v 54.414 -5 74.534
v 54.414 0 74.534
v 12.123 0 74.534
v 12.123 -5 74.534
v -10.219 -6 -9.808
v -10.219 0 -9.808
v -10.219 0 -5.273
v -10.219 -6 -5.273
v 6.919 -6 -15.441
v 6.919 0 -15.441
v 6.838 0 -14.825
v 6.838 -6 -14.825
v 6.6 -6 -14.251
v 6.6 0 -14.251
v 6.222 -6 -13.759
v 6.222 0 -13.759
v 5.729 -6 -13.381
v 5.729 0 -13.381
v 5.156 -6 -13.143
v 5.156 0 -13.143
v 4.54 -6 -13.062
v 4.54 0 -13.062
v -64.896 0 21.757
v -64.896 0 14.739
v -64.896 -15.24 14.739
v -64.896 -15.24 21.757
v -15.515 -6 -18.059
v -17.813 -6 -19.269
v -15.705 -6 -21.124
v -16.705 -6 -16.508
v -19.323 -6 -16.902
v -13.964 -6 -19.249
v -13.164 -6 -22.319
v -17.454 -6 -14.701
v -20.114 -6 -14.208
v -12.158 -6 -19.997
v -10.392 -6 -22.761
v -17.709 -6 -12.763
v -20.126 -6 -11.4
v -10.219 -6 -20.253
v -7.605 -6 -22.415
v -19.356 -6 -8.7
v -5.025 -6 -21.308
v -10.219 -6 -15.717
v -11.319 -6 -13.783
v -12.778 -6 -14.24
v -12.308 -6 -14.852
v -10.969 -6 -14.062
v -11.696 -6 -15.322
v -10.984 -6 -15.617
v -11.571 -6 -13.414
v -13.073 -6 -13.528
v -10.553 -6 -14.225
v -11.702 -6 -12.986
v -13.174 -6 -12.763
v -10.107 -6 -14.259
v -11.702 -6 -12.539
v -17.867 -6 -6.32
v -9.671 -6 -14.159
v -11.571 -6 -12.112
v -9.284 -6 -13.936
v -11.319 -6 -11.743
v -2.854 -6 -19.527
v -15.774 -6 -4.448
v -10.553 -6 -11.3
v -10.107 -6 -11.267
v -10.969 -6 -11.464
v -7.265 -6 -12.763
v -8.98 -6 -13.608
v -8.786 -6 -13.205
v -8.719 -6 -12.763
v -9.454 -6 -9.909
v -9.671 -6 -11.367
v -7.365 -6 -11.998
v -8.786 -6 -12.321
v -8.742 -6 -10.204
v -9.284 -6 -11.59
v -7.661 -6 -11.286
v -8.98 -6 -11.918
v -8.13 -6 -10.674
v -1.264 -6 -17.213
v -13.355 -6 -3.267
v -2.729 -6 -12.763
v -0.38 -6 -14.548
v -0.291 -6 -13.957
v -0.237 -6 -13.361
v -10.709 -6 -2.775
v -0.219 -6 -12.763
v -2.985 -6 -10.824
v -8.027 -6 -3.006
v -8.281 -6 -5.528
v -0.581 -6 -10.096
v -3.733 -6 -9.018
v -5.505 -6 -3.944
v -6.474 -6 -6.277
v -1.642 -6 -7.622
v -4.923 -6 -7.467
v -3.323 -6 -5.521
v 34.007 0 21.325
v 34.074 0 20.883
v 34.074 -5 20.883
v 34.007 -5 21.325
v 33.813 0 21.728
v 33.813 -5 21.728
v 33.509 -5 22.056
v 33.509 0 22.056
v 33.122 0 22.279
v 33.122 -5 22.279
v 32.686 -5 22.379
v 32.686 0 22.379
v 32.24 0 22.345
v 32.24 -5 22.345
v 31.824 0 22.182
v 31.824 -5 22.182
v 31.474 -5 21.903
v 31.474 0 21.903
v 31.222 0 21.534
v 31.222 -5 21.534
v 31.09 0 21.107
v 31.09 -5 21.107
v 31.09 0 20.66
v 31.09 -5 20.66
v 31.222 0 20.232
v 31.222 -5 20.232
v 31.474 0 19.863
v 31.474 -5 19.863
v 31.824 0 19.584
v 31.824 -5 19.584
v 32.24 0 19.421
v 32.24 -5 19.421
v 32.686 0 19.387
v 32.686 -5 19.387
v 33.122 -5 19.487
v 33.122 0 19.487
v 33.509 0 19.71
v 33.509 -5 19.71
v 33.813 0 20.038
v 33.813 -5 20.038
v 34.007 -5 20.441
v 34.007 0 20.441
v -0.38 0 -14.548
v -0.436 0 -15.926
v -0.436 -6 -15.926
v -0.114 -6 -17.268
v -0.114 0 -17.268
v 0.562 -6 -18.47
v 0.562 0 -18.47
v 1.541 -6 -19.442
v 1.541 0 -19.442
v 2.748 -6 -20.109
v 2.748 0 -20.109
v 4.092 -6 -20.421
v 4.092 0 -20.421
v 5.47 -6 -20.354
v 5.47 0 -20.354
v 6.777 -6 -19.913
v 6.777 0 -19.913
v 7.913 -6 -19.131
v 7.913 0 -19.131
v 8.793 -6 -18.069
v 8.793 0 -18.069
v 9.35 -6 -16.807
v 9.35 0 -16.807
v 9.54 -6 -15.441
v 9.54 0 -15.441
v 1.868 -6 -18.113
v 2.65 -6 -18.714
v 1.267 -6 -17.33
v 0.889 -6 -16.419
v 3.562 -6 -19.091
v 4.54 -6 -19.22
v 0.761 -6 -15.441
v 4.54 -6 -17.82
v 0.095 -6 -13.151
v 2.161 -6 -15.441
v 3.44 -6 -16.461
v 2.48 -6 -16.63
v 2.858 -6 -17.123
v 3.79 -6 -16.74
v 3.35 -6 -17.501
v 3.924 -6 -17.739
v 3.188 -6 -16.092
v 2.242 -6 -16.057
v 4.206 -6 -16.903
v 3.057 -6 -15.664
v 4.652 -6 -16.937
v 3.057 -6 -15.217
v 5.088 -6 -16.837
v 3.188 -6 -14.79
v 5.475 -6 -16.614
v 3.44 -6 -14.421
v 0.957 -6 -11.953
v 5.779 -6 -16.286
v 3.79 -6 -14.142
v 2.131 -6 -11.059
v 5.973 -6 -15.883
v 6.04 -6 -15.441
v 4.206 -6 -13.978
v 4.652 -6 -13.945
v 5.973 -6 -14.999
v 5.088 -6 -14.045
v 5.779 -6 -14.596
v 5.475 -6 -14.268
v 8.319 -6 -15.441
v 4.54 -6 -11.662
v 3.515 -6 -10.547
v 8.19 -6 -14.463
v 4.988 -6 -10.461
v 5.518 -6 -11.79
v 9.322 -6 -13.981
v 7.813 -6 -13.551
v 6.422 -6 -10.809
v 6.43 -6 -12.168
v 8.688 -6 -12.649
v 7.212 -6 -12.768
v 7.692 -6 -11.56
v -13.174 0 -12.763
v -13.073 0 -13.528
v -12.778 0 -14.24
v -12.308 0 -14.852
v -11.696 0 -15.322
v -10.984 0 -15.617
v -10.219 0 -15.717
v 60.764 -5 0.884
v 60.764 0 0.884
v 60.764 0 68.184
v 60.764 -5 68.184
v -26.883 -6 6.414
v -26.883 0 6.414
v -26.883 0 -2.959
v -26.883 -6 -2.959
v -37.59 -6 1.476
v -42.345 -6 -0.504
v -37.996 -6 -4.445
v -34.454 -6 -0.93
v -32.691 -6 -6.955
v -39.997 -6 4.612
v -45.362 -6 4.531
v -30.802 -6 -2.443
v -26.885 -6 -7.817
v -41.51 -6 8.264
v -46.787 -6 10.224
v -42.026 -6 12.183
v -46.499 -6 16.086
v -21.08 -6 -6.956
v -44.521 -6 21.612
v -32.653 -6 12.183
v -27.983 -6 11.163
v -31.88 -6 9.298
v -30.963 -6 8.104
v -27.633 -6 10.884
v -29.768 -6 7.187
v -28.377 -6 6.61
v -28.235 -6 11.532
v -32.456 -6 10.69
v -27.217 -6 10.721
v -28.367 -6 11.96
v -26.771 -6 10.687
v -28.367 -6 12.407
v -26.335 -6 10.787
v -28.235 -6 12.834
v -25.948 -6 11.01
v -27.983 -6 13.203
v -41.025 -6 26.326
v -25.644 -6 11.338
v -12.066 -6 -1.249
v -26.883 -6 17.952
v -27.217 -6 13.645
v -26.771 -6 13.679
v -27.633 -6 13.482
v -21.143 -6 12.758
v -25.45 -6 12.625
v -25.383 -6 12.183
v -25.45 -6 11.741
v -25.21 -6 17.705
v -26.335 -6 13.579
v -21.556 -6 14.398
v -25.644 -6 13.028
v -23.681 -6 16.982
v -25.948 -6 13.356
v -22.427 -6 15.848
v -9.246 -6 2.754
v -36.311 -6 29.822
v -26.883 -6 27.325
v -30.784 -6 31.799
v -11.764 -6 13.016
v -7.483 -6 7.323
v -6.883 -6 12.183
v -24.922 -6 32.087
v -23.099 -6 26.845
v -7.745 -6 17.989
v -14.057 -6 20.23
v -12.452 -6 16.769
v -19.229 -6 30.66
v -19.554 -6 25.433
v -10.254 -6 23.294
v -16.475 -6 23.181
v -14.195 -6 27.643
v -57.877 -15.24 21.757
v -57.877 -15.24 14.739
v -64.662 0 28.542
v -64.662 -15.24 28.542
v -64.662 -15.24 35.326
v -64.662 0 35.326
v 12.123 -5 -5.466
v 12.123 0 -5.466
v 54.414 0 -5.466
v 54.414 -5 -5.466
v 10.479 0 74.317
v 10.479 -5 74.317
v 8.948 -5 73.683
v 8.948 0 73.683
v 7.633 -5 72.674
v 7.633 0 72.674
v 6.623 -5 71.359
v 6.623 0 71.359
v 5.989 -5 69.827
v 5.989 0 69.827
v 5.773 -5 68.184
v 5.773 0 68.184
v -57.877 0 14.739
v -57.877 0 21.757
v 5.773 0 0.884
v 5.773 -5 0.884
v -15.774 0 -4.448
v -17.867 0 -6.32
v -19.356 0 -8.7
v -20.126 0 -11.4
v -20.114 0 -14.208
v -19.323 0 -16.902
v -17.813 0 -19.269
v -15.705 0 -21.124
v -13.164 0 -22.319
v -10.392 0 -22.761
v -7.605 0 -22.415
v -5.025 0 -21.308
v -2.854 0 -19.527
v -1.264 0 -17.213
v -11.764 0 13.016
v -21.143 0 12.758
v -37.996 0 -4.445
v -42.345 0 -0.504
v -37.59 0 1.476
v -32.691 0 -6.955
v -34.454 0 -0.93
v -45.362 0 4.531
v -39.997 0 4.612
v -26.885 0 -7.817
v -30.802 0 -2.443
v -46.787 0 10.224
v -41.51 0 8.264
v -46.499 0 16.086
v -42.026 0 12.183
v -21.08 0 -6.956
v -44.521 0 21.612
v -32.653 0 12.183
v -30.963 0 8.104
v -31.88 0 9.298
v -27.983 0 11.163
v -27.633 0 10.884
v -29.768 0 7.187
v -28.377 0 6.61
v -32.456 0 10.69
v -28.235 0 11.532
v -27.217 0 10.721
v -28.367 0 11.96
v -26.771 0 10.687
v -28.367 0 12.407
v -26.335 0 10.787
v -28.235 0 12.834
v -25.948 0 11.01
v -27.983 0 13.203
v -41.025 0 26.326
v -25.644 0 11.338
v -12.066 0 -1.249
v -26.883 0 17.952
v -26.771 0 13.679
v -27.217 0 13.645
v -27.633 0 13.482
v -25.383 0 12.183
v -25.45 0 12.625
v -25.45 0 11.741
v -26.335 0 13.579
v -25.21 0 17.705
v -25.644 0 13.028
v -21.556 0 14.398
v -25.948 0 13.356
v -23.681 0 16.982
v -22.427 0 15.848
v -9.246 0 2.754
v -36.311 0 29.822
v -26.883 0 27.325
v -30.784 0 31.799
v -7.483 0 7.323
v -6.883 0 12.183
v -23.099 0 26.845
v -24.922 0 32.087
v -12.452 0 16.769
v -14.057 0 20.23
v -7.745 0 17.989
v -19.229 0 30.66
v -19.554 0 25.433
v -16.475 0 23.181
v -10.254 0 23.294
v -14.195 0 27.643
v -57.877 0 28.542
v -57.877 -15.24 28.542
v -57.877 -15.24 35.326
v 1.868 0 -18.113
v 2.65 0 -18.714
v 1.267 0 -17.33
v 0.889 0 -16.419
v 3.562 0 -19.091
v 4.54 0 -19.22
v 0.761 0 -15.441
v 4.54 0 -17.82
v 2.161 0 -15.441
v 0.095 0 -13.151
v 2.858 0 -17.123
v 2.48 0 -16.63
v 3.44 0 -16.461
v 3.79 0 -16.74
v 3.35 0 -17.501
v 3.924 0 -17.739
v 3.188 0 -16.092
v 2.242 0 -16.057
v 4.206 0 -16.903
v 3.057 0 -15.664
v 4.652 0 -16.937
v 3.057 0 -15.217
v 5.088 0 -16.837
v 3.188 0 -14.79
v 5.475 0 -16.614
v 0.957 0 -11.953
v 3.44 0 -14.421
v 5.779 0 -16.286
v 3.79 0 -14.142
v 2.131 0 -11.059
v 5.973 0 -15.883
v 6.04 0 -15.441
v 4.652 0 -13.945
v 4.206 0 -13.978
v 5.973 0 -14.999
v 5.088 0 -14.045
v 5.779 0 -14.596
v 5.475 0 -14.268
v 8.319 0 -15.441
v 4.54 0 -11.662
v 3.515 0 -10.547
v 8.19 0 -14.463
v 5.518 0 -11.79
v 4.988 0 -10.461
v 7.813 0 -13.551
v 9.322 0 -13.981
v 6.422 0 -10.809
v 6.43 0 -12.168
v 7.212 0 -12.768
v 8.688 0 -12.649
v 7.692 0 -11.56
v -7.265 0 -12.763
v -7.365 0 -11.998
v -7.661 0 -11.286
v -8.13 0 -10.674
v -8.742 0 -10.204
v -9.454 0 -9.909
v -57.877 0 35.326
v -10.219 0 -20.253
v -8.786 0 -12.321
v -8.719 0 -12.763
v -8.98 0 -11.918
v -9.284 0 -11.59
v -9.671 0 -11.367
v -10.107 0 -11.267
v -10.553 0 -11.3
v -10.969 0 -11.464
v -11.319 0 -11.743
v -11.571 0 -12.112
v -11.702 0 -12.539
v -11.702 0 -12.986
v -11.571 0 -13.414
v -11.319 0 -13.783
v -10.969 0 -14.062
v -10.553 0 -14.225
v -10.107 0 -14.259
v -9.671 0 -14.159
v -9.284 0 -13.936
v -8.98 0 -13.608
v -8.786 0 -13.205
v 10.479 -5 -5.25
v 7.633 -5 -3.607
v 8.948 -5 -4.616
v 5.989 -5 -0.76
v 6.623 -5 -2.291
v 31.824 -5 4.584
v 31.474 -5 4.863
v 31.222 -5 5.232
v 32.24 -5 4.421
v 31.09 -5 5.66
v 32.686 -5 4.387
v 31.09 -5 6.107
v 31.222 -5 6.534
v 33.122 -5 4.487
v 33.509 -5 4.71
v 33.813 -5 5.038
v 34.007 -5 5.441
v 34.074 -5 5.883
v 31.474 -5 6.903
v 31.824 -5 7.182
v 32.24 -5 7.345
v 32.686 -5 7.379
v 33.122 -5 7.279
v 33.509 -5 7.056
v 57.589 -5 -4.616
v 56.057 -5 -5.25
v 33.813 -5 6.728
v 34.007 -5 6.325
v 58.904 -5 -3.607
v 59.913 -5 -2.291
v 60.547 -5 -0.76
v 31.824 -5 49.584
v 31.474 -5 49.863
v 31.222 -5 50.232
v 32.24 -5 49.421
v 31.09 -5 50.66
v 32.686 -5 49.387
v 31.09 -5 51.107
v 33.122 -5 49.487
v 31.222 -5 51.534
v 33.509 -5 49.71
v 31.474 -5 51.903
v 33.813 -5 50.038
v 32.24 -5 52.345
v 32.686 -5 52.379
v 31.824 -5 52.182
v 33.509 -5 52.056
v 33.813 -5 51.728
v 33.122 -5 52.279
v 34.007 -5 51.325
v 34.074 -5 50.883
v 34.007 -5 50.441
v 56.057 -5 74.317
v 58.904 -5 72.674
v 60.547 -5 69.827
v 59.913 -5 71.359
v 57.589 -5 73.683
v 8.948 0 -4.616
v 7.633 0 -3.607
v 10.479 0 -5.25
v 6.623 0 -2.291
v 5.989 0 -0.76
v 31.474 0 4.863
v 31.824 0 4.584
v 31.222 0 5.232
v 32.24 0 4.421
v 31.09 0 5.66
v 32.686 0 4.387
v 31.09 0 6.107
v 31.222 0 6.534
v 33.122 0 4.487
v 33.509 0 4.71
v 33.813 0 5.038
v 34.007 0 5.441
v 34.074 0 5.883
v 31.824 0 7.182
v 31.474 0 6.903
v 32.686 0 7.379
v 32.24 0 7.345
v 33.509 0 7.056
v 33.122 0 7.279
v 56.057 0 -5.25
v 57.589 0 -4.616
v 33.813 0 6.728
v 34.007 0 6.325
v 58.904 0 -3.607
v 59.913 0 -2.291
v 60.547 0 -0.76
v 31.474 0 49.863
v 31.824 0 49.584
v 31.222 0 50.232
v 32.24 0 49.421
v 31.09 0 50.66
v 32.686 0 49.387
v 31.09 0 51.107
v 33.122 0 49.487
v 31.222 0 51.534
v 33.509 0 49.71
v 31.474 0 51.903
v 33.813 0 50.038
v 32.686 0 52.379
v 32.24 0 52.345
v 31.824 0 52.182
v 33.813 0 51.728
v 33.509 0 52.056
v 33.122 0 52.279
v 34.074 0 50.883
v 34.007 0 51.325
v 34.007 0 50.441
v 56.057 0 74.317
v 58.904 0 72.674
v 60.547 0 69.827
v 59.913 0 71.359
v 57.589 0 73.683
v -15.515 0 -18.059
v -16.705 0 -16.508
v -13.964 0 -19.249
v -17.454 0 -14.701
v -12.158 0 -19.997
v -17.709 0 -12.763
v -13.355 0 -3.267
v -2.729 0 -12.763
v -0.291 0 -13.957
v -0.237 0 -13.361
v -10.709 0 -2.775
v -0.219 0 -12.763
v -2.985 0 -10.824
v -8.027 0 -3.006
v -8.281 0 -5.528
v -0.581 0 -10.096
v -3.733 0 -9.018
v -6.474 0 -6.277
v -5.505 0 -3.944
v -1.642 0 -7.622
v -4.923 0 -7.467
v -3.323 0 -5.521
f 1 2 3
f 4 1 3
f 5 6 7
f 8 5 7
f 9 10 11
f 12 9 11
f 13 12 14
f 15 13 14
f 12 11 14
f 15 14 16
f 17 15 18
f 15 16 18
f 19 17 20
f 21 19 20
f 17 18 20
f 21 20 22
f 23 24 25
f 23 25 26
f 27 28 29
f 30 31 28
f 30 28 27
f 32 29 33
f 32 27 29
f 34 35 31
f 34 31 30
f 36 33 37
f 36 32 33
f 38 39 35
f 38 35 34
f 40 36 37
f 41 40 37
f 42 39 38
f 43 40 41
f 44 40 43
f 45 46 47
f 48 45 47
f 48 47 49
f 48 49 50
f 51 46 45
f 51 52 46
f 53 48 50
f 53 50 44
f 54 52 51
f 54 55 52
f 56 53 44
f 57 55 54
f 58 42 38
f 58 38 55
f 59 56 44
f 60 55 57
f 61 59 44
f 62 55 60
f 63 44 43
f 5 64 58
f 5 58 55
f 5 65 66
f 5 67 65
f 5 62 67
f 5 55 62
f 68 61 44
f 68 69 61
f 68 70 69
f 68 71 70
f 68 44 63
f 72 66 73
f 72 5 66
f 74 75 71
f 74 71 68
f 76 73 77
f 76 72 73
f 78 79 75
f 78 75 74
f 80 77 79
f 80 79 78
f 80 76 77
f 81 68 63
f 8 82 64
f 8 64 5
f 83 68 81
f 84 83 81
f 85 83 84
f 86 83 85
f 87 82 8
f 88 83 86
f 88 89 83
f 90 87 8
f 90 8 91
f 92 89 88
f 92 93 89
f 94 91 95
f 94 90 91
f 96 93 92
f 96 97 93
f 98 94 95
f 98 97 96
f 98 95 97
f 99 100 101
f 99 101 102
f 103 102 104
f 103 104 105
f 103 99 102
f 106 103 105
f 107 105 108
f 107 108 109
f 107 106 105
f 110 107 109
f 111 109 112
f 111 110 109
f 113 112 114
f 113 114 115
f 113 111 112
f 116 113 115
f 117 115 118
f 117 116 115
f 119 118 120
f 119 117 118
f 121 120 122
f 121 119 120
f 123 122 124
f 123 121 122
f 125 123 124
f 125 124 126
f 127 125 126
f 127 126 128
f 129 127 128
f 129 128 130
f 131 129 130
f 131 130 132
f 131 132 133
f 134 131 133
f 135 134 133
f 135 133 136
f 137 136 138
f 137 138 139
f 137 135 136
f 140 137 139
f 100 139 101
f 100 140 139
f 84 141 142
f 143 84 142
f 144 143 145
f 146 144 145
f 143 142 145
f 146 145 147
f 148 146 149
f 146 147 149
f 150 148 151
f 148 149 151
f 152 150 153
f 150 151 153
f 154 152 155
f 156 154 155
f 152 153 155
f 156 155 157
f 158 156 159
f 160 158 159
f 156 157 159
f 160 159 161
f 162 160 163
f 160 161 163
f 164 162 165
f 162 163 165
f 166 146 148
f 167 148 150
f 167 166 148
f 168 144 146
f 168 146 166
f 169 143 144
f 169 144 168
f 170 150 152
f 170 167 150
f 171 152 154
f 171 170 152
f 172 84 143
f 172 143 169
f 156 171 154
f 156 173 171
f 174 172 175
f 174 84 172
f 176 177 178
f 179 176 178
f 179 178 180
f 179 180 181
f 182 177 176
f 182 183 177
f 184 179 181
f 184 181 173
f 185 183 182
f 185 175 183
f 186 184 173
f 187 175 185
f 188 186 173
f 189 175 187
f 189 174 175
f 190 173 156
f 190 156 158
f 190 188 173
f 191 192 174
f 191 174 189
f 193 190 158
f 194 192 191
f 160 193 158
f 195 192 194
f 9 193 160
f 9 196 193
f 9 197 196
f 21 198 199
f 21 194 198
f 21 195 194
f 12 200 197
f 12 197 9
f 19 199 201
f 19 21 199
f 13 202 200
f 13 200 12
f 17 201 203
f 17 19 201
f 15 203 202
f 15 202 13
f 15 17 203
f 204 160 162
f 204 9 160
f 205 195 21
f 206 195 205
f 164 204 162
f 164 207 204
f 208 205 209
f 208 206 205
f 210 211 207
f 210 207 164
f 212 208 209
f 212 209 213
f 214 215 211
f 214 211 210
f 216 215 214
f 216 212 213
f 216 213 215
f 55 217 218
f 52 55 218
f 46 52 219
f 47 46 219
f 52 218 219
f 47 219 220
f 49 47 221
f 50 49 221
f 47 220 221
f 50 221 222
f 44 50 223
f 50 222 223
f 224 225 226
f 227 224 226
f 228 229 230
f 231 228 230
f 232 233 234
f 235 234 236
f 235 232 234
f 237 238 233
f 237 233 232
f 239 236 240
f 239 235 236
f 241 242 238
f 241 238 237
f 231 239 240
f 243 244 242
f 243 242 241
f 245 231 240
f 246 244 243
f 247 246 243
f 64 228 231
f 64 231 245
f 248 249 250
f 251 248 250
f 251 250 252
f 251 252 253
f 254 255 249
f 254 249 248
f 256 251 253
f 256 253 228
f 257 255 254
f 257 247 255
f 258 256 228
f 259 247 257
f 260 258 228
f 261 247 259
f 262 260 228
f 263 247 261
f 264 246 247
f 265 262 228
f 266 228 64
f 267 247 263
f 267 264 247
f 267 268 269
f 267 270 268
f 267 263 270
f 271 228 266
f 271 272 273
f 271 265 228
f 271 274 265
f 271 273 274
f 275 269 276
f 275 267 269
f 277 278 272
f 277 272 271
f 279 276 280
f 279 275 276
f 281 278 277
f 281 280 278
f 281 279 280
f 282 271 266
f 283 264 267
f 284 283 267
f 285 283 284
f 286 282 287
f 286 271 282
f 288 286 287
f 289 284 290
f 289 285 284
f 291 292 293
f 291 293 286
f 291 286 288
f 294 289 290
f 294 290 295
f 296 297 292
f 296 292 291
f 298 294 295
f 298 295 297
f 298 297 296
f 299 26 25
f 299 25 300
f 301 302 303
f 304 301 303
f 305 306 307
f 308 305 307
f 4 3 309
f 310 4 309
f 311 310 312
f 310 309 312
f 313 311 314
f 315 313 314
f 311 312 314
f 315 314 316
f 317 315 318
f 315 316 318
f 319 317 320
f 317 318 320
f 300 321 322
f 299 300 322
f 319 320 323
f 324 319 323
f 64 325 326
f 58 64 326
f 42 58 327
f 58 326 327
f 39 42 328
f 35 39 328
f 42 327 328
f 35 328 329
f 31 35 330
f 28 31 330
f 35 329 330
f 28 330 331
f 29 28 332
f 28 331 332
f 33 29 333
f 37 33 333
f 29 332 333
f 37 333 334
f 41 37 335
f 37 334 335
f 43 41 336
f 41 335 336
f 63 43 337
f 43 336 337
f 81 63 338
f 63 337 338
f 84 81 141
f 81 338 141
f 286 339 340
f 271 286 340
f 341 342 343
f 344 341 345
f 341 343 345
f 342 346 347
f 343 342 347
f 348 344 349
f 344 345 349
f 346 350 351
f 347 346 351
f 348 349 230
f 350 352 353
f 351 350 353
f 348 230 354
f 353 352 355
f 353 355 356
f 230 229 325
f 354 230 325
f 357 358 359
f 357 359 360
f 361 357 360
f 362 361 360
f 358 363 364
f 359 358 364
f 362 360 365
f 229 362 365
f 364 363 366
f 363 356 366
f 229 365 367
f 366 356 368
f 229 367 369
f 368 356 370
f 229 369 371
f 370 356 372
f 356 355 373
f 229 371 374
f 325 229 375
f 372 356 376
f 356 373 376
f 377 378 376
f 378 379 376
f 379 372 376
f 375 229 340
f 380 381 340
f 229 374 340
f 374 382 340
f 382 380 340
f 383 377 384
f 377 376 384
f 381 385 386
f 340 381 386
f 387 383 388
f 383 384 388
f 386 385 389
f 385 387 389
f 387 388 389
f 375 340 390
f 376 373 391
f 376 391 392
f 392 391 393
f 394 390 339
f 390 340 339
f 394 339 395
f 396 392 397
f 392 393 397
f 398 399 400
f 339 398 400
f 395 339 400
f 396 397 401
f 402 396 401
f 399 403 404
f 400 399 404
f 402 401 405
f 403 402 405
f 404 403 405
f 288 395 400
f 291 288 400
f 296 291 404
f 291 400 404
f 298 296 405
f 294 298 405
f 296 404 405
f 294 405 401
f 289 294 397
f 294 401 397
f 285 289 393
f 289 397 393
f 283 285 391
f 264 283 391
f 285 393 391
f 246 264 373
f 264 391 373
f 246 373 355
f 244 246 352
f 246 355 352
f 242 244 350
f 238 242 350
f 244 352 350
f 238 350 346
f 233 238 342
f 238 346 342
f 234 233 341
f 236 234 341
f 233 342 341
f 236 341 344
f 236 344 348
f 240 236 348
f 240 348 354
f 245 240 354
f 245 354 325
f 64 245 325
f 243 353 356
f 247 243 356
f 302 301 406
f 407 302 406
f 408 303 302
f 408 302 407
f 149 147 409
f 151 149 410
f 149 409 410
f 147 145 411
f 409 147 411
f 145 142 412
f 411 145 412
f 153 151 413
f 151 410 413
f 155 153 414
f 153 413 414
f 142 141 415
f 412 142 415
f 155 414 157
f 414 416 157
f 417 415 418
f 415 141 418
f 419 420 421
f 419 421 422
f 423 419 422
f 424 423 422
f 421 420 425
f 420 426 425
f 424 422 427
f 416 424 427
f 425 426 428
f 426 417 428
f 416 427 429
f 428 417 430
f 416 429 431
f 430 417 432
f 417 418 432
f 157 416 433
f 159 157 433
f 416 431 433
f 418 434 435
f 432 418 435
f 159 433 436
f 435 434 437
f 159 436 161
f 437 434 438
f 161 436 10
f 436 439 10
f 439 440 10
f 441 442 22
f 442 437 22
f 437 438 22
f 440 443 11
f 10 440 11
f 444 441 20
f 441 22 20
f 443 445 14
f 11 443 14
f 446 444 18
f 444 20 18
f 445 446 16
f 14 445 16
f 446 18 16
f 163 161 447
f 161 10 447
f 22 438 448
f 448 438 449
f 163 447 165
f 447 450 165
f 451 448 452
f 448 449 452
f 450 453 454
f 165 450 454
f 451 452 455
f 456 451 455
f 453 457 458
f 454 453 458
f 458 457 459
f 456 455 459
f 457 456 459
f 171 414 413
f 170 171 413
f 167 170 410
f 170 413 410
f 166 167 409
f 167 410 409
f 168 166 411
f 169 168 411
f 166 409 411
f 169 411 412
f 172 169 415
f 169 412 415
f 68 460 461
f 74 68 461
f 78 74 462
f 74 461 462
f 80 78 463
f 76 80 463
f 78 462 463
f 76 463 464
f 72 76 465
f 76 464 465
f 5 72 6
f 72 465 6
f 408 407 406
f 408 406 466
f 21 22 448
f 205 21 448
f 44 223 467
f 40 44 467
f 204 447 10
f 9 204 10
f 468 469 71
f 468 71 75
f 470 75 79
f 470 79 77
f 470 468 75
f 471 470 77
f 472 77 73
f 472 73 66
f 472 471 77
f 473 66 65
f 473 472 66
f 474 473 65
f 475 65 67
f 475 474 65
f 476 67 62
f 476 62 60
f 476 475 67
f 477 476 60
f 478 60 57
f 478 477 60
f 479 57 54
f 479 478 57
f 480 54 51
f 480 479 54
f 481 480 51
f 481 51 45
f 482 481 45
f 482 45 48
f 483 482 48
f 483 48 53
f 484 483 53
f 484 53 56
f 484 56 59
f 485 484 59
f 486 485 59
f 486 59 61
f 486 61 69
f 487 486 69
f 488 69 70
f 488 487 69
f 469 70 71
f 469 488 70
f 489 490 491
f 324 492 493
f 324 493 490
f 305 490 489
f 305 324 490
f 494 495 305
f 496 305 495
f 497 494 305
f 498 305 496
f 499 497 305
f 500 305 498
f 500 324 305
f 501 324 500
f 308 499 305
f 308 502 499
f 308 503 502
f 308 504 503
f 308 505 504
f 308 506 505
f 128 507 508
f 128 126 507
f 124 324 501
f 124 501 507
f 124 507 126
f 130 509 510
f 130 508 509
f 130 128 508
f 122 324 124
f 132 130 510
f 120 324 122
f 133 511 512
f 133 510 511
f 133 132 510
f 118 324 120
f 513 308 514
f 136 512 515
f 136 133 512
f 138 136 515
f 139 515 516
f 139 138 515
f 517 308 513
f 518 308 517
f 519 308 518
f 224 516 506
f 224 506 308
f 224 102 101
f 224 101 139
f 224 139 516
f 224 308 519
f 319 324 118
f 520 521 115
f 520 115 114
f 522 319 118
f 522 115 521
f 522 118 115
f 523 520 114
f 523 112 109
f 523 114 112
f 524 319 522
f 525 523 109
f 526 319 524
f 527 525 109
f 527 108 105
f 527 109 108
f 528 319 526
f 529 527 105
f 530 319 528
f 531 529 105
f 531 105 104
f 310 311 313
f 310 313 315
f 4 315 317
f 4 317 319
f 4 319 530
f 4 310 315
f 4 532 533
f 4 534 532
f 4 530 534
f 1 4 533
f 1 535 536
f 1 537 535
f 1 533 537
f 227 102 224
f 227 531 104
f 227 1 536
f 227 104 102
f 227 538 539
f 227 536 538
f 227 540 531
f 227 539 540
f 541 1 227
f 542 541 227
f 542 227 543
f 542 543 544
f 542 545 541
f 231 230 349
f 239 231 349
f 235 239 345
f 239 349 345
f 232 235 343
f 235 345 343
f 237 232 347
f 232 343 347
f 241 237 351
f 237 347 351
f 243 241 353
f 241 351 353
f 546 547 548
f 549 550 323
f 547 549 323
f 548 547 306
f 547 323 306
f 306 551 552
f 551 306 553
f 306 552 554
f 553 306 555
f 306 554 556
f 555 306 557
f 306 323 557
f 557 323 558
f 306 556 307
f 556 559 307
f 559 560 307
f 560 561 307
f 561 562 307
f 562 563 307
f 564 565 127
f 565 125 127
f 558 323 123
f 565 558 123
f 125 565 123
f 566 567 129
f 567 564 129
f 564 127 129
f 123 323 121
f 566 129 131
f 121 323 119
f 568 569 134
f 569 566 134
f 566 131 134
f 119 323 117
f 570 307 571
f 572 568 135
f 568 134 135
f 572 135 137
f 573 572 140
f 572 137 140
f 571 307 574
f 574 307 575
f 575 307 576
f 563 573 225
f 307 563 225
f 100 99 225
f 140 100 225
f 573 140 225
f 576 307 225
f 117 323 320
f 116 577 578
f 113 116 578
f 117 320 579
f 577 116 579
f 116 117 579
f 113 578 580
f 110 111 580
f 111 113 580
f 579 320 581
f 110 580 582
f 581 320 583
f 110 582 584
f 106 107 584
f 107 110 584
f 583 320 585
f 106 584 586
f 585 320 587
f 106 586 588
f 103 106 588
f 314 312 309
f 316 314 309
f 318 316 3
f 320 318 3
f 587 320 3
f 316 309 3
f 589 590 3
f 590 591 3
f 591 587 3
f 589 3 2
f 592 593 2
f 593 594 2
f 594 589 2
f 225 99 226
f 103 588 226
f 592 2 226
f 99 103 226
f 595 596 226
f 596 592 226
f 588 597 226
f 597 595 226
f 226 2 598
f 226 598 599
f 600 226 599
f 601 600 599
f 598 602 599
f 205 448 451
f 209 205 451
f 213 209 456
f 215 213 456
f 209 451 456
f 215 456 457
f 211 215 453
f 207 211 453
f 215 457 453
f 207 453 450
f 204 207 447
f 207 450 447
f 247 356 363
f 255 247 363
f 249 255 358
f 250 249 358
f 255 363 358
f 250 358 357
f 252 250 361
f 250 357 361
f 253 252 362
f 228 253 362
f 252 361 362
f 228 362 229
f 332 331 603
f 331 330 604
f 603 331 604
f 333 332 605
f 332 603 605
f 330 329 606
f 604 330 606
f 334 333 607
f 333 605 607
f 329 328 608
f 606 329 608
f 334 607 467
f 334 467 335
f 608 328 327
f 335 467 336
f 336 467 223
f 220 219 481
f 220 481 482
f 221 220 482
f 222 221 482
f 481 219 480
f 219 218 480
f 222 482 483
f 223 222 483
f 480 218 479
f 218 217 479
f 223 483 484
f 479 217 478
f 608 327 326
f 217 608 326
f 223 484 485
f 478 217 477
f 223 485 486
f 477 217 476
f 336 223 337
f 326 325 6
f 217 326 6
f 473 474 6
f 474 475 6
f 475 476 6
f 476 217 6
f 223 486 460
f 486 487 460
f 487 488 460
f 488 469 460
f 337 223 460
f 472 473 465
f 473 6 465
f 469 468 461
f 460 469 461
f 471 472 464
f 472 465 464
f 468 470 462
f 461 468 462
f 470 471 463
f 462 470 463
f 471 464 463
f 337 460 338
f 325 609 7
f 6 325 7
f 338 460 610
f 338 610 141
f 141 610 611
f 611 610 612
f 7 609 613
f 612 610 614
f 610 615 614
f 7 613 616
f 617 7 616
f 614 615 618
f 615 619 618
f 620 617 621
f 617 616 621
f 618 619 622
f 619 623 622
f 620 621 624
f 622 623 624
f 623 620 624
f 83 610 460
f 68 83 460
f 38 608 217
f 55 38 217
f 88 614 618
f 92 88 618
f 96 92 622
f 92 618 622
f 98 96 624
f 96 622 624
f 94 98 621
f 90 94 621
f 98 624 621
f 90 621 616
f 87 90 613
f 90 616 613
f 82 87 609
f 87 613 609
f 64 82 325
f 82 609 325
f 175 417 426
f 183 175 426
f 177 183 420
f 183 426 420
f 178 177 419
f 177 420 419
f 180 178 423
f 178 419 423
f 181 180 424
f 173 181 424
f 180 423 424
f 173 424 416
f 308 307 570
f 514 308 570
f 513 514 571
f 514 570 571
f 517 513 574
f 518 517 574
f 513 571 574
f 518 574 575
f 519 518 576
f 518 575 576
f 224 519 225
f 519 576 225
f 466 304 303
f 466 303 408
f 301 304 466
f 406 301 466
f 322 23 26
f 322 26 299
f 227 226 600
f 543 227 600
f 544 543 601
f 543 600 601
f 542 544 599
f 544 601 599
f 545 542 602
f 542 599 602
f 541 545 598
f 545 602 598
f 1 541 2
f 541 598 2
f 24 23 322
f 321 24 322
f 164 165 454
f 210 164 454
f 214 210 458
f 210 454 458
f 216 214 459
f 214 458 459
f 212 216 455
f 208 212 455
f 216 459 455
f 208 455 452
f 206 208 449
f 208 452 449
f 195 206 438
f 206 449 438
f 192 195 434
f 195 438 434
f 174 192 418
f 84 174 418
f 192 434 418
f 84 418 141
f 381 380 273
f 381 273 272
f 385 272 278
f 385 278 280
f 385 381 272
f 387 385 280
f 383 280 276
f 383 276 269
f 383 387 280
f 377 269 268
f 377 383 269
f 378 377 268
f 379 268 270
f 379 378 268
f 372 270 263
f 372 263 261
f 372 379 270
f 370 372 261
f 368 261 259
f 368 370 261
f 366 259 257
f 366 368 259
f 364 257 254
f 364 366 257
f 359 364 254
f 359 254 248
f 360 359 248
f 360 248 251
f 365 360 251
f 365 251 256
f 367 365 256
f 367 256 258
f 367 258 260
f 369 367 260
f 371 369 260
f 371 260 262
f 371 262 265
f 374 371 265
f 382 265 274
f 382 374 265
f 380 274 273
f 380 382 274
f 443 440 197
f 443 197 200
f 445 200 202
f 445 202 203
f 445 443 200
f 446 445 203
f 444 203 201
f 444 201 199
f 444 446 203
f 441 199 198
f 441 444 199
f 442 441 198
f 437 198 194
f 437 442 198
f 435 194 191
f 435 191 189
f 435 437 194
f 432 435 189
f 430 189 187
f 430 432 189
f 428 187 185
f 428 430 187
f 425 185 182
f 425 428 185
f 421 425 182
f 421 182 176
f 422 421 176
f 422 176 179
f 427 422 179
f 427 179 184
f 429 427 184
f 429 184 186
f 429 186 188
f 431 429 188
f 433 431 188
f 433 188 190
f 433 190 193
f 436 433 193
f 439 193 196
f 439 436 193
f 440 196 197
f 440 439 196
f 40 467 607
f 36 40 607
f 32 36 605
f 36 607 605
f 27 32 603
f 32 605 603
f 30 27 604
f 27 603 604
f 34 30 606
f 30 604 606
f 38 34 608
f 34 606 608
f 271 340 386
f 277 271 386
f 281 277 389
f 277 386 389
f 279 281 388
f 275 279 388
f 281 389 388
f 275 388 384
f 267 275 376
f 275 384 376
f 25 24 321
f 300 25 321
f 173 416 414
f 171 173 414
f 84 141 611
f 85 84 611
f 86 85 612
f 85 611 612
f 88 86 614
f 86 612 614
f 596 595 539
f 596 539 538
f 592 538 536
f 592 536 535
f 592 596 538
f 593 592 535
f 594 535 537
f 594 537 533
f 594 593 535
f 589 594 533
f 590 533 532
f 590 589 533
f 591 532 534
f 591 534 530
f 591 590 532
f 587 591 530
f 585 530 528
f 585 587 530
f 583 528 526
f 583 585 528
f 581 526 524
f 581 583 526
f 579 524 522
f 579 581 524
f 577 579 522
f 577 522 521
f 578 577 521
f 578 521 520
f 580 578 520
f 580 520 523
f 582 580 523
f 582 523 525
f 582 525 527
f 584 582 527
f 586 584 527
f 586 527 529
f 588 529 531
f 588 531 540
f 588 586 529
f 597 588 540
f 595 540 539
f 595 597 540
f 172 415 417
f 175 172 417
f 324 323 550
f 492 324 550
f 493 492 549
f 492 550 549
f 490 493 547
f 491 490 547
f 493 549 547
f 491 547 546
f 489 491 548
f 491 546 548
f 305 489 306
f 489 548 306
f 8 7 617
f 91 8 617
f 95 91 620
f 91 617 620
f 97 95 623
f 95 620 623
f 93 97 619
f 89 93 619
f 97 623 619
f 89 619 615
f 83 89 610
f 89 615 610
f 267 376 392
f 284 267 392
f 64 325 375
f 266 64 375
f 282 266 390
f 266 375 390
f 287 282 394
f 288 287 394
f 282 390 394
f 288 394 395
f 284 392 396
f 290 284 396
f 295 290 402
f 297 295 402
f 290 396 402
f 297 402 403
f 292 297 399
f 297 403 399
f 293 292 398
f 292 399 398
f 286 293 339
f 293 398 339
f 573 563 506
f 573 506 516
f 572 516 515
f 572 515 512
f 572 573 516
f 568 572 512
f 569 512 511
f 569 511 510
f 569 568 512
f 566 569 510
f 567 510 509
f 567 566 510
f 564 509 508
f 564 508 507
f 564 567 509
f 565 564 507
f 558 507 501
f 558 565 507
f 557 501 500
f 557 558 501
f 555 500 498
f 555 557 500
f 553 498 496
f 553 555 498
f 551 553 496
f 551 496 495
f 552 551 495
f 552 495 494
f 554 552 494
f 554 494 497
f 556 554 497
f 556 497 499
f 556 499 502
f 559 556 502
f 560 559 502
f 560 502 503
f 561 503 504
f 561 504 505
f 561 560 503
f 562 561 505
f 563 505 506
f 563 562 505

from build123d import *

# Parameters (mm, degrees)
F0_R     = 1.5
F1_DEPTH = 6
F2_R     = 1.5
F3_DEPTH = 5
F4_W     = 7.018421
F4_H     = 7.01842
F4_W_2   = 6.784473
F4_H_2   = 6.784472
F5_DEPTH = 15.24


with BuildPart() as f1:
    # F0 (on Front) → F1 (new body)
    with BuildSketch(Plane.XZ):
        with BuildLine():
            ThreePointArc((-15.773883, -4.447561), (-9.245511, 2.754156), (-6.883402, 12.183091))
            ThreePointArc((-6.883402, 12.183091), (-44.521293, 21.612025), (-15.773883, -4.447561))
        make_face()
        with BuildLine():
            Line((-42.025516, 12.183091), (-32.652731, 12.183091))
            ThreePointArc((-32.652731, 12.183091), (-30.962933, 8.103559), (-26.883402, 6.413762))
            Line((-26.883402, 6.413762), (-26.883402, -2.959023))
            ThreePointArc((-26.883402, -2.959023), (-37.590493, 1.475999), (-42.025516, 12.183091))
        make_face(mode=Mode.SUBTRACT)
        with Locations((-26.883402, 12.183091)):
            Circle(F0_R, mode=Mode.SUBTRACT)
        with BuildLine():
            Line((-26.883402, 17.952419), (-26.883402, 27.325204))
            ThreePointArc((-26.883402, 27.325204), (-16.475064, 23.180823), (-11.76423, 13.016304))
            Line((-11.76423, 13.016304), (-21.142797, 12.758075))
            ThreePointArc((-21.142797, 12.758075), (-23.012493, 16.461082), (-26.883402, 17.952419))
        make_face(mode=Mode.SUBTRACT)
        with BuildLine():
            ThreePointArc((-0.219123, -12.762887), (-5.504656, -3.943942), (-15.773883, -4.447561))
            ThreePointArc((-15.773883, -4.447561), (-15.705018, -21.123805), (-0.379777, -14.54818))
            ThreePointArc((-0.379777, -14.54818), (-0.259368, -13.659141), (-0.219123, -12.762887))
        make_face()
        with BuildLine():
            Line((-17.708856, -12.762887), (-13.173558, -12.762887))
            ThreePointArc((-13.173558, -12.762887), (-12.308224, -14.851988), (-10.219123, -15.717322))
            Line((-10.219123, -15.717322), (-10.219123, -20.25262))
            ThreePointArc((-10.219123, -20.25262), (-15.515164, -18.058928), (-17.708856, -12.762887))
        make_face(mode=Mode.SUBTRACT)
        with Locations((-10.219123, -12.762887)):
            Circle(F0_R, mode=Mode.SUBTRACT)
        with BuildLine():
            ThreePointArc((-7.264688, -12.762887), (-8.130022, -10.673786), (-10.219123, -9.808452))
            Line((-10.219123, -9.808452), (-10.219123, -5.273154))
            ThreePointArc((-10.219123, -5.273154), (-4.923082, -7.466846), (-2.72939, -12.762887))
            Line((-2.72939, -12.762887), (-7.264688, -12.762887))
        make_face(mode=Mode.SUBTRACT)
        with BuildLine():
            ThreePointArc((9.539896, -15.440827), (4.988022, -10.460949), (-0.379777, -14.54818))
            ThreePointArc((-0.379777, -14.54818), (4.091769, -20.420704), (9.539896, -15.440827))
        make_face()
        with BuildLine():
            Line((0.760653, -15.440827), (2.160979, -15.440827))
            ThreePointArc((2.160979, -15.440827), (2.857748, -17.122975), (4.539896, -17.819744))
            Line((4.539896, -17.819744), (4.539896, -19.22007))
            ThreePointArc((4.539896, -19.22007), (1.867568, -18.113155), (0.760653, -15.440827))
        make_face(mode=Mode.SUBTRACT)
        with Locations((4.539896, -15.440827)):
            Circle(F0_R, mode=Mode.SUBTRACT)
        with BuildLine():
            Line((4.539896, -13.06191), (4.539896, -11.661584))
            ThreePointArc((4.539896, -11.661584), (7.212224, -12.768498), (8.319139, -15.440827))
            Line((8.319139, -15.440827), (6.918813, -15.440827))
            ThreePointArc((6.918813, -15.440827), (6.222044, -13.758678), (4.539896, -13.06191))
        make_face(mode=Mode.SUBTRACT)
    extrude(amount=F1_DEPTH)


with BuildPart() as f3:
    # F2 (on Front) → F3 (new body)
    with BuildSketch(Plane.XZ):
        with BuildLine():
            Line((54.413693, 74.533505), (12.122693, 74.533505))
            ThreePointArc((12.122693, 74.533505), (7.632565, 72.673633), (5.772693, 68.183505))
            Line((5.772693, 68.183505), (5.772693, 0.883505))
            ThreePointArc((5.772693, 0.883505), (7.632565, -3.606623), (12.122693, -5.466495))
            Line((12.122693, -5.466495), (54.413693, -5.466495))
            ThreePointArc((54.413693, -5.466495), (58.903821, -3.606623), (60.763693, 0.883505))
            Line((60.763693, 0.883505), (60.763693, 30.880905))
            Line((60.763693, 30.880905), (60.763693, 68.183505))
            ThreePointArc((60.763693, 68.183505), (58.903821, 72.673633), (54.413693, 74.533505))
        make_face()
        with Locations((32.573591, 5.883088)):
            Circle(F2_R, mode=Mode.SUBTRACT)
        with Locations((32.573591, 20.883088)):
            Circle(F2_R, mode=Mode.SUBTRACT)
        with Locations((32.573591, 50.883088)):
            Circle(F2_R, mode=Mode.SUBTRACT)
    extrude(amount=F3_DEPTH)


with BuildPart() as f5:
    # F4 (on Front) → F5 (new body)
    with BuildSketch(Plane.XZ):
        with Locations((-61.386353, 18.247895)):
            Rectangle(F4_W, F4_H)
        with Locations((-61.269379, 31.933816)):
            Rectangle(F4_W_2, F4_H_2)
    extrude(amount=F5_DEPTH)


solid = Compound([f1.part, f3.part, f5.part])
